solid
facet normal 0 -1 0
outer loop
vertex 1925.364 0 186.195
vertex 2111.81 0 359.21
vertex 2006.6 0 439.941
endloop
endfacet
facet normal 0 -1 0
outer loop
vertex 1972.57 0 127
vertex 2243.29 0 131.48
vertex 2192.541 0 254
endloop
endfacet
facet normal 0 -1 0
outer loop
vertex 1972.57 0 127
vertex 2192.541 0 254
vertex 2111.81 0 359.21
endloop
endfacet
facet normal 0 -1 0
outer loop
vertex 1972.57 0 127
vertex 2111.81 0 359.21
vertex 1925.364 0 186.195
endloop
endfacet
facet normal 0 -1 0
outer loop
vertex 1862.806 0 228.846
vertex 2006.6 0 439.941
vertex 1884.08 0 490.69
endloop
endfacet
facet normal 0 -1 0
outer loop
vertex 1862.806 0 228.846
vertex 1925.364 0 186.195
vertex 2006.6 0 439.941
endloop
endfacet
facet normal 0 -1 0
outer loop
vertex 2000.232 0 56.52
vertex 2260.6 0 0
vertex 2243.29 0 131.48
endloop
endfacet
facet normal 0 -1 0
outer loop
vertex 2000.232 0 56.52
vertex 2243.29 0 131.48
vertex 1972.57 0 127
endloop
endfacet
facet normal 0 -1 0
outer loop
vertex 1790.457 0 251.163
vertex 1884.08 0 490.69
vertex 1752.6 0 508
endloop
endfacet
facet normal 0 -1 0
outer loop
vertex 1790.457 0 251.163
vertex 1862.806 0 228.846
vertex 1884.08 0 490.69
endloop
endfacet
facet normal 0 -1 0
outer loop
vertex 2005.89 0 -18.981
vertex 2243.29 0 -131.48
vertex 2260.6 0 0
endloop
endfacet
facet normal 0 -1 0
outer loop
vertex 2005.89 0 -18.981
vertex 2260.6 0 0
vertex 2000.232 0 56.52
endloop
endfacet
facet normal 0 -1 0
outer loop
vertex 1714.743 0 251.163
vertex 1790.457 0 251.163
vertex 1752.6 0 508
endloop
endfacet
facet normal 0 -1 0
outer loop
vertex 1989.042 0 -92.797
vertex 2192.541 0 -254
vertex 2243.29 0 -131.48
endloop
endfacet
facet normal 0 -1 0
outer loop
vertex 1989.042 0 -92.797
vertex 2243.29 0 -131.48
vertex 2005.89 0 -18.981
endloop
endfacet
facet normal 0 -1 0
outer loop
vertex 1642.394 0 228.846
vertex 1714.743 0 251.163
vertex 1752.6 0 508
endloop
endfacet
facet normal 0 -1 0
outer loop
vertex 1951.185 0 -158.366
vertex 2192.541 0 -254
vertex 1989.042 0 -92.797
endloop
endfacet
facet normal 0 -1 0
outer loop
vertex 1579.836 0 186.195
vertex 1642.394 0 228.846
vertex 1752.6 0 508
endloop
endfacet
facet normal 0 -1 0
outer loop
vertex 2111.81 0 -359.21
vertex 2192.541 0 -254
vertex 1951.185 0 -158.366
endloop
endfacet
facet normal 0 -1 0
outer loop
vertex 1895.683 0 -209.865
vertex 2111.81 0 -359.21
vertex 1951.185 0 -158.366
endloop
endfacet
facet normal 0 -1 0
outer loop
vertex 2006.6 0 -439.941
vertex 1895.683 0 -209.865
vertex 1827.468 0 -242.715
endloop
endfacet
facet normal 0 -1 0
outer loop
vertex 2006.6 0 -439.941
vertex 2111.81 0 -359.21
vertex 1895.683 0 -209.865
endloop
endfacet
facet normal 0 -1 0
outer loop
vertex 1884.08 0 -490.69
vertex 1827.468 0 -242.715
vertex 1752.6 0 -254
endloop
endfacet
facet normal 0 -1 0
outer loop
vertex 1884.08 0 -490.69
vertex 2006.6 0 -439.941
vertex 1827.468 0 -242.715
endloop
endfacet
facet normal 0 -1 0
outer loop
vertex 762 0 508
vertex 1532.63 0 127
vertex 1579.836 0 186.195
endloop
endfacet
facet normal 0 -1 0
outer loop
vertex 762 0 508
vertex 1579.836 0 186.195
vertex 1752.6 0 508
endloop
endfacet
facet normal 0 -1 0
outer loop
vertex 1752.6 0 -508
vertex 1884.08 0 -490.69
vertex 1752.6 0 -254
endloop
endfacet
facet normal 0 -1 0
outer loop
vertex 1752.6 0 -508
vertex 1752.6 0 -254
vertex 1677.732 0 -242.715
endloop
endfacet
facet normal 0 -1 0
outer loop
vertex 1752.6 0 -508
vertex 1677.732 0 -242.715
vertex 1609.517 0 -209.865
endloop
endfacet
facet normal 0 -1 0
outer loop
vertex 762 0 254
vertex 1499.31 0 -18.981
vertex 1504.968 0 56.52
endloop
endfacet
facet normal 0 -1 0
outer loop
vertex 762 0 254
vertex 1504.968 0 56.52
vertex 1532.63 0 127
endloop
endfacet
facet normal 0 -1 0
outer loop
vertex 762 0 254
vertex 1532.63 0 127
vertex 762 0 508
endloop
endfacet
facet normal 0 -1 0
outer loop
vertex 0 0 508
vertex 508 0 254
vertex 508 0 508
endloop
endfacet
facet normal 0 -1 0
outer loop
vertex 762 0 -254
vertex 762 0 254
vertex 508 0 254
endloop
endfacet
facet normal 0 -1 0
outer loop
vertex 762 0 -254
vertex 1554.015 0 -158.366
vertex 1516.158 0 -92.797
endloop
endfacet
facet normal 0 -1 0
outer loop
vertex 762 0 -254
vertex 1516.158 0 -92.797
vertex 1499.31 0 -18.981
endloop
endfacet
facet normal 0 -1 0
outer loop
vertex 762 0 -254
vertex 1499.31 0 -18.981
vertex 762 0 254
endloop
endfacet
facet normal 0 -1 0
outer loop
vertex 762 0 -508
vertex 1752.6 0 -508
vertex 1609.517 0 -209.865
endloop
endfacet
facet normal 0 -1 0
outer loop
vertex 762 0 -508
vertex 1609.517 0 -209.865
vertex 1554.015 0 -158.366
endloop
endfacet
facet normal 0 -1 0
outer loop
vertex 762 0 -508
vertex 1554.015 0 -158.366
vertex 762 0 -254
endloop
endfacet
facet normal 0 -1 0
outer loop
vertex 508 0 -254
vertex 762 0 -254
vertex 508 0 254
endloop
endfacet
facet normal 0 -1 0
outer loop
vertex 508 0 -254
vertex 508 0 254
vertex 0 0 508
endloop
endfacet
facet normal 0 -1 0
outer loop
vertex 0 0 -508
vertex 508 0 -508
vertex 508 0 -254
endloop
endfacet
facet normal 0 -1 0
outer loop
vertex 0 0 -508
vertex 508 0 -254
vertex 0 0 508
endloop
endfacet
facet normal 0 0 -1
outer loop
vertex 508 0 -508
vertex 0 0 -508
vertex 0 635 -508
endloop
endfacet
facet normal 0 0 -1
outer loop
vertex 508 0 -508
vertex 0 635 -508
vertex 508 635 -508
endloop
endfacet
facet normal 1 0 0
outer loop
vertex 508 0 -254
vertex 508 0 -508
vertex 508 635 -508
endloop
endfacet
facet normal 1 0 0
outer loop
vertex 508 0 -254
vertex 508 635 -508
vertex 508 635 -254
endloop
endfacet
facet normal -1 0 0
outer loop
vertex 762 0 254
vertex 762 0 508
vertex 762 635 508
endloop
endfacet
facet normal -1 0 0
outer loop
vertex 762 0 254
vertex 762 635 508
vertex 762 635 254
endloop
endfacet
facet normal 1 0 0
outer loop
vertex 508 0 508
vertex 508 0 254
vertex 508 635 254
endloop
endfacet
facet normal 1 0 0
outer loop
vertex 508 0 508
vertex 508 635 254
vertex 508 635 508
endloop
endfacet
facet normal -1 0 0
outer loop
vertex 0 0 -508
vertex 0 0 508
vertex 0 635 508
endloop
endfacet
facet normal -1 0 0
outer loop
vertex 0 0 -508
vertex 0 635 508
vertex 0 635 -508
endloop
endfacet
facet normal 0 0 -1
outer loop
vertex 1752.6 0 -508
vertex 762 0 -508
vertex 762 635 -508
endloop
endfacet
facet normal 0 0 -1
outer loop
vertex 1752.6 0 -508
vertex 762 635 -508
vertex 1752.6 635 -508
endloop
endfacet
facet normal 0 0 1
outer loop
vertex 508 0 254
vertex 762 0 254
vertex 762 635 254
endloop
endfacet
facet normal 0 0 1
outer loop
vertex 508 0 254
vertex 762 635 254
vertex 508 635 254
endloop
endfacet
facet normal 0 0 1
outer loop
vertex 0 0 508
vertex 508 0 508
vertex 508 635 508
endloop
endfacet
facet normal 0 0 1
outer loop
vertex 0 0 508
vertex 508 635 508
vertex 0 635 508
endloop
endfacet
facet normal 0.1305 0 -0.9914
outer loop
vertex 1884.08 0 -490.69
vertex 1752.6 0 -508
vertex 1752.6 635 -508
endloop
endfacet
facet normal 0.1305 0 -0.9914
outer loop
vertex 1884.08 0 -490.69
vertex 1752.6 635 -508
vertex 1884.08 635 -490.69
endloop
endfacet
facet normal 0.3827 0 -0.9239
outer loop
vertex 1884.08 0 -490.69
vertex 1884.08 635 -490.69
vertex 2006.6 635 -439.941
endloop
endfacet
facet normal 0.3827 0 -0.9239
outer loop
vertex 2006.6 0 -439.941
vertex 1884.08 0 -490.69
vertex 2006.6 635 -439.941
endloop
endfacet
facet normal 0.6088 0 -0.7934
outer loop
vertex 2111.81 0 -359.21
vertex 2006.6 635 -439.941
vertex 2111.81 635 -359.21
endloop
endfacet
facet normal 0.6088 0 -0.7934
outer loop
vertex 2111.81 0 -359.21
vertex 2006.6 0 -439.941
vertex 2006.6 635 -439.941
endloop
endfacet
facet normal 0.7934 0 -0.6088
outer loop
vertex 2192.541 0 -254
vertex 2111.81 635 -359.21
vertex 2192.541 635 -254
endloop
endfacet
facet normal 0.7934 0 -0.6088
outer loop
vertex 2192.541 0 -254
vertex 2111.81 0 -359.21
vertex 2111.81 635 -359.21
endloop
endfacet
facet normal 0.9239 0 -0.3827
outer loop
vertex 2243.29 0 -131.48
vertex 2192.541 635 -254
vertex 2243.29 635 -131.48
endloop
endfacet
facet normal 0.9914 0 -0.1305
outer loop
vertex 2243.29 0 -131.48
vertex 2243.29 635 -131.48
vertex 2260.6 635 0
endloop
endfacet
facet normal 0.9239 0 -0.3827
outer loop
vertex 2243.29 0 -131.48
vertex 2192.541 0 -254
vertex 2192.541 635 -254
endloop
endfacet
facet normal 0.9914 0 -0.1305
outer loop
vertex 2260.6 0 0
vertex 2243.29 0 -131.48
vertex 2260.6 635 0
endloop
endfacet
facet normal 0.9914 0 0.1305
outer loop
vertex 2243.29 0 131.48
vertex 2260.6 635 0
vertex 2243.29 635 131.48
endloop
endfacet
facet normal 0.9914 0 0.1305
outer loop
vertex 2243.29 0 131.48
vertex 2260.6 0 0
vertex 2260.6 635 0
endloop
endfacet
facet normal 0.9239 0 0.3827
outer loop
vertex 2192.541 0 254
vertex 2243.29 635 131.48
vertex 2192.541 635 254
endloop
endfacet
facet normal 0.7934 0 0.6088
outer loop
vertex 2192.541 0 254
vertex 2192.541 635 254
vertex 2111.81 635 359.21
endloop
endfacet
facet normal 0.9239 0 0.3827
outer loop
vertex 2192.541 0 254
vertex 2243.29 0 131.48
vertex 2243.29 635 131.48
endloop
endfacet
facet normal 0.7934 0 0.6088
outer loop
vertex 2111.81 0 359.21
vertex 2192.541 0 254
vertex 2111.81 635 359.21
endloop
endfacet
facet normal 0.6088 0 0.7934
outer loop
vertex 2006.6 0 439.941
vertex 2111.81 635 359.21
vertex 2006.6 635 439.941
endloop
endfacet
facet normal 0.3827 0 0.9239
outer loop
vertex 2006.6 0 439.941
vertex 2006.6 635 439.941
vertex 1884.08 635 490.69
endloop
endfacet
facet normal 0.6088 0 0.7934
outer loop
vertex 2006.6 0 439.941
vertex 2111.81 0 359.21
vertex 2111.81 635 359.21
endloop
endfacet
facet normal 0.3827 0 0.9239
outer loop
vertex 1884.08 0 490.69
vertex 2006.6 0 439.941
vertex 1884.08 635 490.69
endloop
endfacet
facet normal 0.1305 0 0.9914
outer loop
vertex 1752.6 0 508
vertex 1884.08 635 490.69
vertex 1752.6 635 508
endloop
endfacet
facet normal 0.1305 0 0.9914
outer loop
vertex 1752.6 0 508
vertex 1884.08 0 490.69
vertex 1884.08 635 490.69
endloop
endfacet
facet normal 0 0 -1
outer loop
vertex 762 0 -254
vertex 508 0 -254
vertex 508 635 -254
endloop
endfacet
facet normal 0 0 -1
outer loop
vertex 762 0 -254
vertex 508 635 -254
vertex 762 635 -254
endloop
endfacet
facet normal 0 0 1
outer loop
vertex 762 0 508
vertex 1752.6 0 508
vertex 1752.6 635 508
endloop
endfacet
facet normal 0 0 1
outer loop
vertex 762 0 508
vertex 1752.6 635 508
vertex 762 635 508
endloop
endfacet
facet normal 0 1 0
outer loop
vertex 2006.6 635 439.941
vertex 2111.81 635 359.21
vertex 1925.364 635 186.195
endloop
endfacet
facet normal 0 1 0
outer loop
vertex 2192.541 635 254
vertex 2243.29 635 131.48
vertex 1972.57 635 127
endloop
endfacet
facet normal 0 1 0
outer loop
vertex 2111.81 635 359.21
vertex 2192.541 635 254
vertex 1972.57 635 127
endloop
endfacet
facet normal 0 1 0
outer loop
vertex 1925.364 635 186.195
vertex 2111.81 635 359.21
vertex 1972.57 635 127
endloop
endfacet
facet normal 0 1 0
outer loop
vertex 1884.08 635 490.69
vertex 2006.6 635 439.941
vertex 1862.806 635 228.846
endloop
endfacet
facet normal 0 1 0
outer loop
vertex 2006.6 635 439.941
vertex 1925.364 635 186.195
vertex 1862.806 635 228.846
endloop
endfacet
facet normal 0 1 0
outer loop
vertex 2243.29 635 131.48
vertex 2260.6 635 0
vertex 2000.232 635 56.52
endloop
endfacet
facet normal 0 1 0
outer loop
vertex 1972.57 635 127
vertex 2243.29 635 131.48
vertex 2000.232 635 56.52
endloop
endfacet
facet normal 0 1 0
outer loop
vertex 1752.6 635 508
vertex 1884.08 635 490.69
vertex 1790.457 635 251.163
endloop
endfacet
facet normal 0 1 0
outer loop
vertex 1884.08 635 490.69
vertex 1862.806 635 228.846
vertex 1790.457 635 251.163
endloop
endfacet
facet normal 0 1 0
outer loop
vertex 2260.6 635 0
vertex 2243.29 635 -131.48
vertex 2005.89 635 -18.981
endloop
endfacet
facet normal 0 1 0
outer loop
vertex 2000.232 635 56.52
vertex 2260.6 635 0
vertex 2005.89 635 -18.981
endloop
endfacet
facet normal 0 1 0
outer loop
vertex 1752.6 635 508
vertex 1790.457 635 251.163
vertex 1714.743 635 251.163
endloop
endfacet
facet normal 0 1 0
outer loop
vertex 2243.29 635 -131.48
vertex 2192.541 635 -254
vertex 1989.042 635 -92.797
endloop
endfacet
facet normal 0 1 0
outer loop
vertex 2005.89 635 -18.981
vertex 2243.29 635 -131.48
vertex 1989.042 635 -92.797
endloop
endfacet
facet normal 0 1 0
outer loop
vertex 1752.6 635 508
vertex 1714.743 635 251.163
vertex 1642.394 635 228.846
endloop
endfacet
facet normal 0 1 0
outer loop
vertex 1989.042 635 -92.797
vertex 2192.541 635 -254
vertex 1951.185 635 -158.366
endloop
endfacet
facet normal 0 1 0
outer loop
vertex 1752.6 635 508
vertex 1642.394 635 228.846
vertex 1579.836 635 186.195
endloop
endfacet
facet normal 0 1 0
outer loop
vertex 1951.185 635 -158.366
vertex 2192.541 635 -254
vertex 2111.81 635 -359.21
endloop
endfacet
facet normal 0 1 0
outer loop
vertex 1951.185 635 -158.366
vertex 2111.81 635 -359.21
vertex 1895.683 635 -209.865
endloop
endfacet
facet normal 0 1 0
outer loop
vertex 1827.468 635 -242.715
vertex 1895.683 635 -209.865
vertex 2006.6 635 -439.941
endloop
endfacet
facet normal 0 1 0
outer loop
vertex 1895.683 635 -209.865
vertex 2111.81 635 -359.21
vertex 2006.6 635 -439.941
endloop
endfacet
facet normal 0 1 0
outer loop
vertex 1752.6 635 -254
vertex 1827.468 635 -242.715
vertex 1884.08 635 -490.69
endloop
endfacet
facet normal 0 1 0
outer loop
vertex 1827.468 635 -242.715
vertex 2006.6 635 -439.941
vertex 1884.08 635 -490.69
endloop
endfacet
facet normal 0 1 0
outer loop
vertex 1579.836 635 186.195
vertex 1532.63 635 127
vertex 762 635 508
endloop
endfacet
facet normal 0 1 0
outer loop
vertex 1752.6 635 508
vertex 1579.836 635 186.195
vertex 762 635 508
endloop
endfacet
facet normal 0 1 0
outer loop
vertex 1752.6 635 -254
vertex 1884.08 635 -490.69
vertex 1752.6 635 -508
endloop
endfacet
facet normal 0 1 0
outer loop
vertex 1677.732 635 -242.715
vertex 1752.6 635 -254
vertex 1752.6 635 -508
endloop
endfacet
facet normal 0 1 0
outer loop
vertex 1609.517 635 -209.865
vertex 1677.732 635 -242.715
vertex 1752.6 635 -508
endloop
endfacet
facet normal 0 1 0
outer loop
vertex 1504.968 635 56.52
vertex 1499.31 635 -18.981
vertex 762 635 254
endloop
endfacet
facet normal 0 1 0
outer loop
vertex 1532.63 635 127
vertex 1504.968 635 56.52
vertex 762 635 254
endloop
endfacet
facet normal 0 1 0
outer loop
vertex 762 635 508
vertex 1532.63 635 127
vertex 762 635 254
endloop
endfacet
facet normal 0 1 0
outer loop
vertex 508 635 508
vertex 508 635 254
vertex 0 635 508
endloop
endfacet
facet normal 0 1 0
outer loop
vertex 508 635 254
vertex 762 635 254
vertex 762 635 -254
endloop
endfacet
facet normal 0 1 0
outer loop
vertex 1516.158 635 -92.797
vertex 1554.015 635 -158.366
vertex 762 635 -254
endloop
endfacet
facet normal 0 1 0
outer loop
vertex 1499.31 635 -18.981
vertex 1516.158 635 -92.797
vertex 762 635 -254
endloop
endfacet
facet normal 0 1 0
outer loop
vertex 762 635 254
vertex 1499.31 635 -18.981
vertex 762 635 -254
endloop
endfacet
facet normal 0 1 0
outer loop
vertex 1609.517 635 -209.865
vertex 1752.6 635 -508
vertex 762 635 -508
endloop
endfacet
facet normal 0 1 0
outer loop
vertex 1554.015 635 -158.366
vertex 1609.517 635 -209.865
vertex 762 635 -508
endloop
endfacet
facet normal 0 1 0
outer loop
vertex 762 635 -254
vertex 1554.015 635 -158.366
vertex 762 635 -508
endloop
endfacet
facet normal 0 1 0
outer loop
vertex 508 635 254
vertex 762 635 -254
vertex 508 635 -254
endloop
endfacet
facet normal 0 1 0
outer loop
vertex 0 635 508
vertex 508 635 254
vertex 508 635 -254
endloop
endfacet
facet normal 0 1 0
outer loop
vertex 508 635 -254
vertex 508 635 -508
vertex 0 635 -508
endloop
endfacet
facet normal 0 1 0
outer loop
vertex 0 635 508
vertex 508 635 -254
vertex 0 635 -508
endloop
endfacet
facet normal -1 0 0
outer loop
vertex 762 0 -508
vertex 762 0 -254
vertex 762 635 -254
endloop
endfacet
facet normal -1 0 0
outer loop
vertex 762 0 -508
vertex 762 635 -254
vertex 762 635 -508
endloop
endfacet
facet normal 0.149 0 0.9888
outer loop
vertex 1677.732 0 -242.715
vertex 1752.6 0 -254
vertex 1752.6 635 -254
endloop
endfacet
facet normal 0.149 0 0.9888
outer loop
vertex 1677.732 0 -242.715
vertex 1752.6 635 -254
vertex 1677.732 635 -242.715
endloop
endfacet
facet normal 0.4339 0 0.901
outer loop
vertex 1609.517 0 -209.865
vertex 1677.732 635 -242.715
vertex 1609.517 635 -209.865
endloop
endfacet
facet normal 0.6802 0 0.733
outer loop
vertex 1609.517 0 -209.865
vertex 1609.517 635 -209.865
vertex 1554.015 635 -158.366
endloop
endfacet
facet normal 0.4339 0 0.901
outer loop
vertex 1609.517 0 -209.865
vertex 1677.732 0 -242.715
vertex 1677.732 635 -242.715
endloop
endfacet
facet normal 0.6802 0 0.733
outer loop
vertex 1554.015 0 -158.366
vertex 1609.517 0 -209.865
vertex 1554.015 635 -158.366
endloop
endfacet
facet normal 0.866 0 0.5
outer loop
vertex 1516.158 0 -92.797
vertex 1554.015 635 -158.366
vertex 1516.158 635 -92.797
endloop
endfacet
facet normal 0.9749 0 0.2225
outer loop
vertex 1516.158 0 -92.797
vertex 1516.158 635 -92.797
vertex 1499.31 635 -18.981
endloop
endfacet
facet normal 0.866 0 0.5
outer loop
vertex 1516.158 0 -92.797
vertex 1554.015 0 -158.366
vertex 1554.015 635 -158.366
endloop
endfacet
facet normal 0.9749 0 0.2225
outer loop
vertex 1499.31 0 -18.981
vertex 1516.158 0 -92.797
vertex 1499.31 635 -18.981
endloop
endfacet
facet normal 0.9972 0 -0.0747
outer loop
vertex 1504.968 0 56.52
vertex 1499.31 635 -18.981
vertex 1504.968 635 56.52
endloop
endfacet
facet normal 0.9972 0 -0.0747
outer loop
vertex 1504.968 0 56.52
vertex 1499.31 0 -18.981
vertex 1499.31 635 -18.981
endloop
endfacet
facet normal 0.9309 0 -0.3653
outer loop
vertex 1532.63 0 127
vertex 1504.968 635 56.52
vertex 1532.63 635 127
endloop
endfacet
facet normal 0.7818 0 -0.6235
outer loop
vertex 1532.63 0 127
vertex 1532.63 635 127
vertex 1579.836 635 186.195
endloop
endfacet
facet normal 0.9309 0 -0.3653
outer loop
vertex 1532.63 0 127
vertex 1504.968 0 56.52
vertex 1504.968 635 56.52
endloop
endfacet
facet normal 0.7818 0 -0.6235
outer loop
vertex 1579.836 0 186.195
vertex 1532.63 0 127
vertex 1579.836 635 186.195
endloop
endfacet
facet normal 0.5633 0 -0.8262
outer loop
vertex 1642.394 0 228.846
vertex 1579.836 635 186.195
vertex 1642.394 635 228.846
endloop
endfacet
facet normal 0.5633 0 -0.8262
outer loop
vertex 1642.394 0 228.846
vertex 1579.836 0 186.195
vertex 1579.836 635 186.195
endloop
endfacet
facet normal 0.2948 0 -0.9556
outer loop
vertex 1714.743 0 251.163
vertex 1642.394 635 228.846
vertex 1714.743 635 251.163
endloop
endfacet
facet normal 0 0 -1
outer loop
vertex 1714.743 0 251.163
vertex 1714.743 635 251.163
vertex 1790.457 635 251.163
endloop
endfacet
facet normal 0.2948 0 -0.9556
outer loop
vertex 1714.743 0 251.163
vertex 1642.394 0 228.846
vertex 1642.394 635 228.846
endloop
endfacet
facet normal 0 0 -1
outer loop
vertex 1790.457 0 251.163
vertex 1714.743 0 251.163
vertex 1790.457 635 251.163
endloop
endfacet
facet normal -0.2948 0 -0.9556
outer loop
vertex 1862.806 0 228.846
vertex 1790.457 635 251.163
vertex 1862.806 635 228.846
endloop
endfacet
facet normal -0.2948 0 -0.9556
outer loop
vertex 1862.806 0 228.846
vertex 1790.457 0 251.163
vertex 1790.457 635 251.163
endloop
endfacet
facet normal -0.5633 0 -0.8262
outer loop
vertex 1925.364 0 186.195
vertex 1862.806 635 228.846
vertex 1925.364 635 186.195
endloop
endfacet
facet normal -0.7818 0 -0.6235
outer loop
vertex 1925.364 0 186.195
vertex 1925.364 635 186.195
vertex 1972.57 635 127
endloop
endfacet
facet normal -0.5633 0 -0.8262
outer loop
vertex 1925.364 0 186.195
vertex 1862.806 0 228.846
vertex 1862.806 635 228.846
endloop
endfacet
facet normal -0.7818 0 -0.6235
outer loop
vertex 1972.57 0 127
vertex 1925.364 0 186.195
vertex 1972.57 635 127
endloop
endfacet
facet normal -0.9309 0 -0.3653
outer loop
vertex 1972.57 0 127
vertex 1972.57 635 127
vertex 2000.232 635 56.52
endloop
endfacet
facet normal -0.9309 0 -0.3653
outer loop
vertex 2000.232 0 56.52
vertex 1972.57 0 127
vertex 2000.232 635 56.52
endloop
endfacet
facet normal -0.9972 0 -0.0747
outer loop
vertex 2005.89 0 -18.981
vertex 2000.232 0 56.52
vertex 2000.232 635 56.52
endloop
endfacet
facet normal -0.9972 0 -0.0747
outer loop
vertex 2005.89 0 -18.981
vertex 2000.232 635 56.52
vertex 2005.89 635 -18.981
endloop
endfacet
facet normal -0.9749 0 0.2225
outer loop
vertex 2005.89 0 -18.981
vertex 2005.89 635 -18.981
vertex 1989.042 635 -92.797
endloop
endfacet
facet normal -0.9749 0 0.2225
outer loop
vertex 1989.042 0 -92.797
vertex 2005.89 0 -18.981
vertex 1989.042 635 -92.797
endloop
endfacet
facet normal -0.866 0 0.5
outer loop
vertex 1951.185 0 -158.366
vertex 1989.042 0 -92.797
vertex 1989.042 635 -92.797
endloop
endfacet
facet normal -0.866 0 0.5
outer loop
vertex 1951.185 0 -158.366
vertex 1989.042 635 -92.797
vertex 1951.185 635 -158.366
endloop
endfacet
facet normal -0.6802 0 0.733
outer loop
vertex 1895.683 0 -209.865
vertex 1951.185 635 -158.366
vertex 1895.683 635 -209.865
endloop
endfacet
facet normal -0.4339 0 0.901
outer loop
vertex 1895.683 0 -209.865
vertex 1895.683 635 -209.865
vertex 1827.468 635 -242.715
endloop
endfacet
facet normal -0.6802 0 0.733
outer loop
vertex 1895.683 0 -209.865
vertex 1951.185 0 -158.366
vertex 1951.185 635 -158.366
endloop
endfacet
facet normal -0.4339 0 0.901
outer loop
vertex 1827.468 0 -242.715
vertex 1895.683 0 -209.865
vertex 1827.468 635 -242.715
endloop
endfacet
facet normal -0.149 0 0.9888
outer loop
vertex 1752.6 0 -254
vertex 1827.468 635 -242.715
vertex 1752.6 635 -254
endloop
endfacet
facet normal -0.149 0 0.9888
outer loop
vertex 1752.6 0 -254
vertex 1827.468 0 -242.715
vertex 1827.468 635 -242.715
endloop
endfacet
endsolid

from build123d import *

# Parameters (mm, degrees)
SKETCH1_R           = 254
BOSS_EXTRUDE1_DEPTH = 635


with BuildPart() as part:
    # Sketch1 → Boss-Extrude1 (new body)
    with BuildSketch(Plane(origin=(0, 0, 0), x_dir=(1, 0, 0), z_dir=(0, 1, 0))):
        with BuildLine():
            Line((0, -508), (0, 508))
            Line((0, 508), (508, 508))
            Line((508, 508), (508, 254))
            Line((508, 254), (762, 254))
            Line((762, 254), (762, 508))
            Line((762, 508), (1752.6, 508))
            ThreePointArc((1752.6, 508), (2260.6, 0), (1752.6, -508))
            Line((1752.6, -508), (762, -508))
            Line((762, -508), (762, -254))
            Line((762, -254), (508, -254))
            Line((508, -254), (508, -508))
            Line((508, -508), (0, -508))
        make_face()
        with Locations(Location((1752.6, 0, 0), (0, 0, 90))):
            Circle(SKETCH1_R, mode=Mode.SUBTRACT)
    extrude(amount=BOSS_EXTRUDE1_DEPTH)


solid = part.part
